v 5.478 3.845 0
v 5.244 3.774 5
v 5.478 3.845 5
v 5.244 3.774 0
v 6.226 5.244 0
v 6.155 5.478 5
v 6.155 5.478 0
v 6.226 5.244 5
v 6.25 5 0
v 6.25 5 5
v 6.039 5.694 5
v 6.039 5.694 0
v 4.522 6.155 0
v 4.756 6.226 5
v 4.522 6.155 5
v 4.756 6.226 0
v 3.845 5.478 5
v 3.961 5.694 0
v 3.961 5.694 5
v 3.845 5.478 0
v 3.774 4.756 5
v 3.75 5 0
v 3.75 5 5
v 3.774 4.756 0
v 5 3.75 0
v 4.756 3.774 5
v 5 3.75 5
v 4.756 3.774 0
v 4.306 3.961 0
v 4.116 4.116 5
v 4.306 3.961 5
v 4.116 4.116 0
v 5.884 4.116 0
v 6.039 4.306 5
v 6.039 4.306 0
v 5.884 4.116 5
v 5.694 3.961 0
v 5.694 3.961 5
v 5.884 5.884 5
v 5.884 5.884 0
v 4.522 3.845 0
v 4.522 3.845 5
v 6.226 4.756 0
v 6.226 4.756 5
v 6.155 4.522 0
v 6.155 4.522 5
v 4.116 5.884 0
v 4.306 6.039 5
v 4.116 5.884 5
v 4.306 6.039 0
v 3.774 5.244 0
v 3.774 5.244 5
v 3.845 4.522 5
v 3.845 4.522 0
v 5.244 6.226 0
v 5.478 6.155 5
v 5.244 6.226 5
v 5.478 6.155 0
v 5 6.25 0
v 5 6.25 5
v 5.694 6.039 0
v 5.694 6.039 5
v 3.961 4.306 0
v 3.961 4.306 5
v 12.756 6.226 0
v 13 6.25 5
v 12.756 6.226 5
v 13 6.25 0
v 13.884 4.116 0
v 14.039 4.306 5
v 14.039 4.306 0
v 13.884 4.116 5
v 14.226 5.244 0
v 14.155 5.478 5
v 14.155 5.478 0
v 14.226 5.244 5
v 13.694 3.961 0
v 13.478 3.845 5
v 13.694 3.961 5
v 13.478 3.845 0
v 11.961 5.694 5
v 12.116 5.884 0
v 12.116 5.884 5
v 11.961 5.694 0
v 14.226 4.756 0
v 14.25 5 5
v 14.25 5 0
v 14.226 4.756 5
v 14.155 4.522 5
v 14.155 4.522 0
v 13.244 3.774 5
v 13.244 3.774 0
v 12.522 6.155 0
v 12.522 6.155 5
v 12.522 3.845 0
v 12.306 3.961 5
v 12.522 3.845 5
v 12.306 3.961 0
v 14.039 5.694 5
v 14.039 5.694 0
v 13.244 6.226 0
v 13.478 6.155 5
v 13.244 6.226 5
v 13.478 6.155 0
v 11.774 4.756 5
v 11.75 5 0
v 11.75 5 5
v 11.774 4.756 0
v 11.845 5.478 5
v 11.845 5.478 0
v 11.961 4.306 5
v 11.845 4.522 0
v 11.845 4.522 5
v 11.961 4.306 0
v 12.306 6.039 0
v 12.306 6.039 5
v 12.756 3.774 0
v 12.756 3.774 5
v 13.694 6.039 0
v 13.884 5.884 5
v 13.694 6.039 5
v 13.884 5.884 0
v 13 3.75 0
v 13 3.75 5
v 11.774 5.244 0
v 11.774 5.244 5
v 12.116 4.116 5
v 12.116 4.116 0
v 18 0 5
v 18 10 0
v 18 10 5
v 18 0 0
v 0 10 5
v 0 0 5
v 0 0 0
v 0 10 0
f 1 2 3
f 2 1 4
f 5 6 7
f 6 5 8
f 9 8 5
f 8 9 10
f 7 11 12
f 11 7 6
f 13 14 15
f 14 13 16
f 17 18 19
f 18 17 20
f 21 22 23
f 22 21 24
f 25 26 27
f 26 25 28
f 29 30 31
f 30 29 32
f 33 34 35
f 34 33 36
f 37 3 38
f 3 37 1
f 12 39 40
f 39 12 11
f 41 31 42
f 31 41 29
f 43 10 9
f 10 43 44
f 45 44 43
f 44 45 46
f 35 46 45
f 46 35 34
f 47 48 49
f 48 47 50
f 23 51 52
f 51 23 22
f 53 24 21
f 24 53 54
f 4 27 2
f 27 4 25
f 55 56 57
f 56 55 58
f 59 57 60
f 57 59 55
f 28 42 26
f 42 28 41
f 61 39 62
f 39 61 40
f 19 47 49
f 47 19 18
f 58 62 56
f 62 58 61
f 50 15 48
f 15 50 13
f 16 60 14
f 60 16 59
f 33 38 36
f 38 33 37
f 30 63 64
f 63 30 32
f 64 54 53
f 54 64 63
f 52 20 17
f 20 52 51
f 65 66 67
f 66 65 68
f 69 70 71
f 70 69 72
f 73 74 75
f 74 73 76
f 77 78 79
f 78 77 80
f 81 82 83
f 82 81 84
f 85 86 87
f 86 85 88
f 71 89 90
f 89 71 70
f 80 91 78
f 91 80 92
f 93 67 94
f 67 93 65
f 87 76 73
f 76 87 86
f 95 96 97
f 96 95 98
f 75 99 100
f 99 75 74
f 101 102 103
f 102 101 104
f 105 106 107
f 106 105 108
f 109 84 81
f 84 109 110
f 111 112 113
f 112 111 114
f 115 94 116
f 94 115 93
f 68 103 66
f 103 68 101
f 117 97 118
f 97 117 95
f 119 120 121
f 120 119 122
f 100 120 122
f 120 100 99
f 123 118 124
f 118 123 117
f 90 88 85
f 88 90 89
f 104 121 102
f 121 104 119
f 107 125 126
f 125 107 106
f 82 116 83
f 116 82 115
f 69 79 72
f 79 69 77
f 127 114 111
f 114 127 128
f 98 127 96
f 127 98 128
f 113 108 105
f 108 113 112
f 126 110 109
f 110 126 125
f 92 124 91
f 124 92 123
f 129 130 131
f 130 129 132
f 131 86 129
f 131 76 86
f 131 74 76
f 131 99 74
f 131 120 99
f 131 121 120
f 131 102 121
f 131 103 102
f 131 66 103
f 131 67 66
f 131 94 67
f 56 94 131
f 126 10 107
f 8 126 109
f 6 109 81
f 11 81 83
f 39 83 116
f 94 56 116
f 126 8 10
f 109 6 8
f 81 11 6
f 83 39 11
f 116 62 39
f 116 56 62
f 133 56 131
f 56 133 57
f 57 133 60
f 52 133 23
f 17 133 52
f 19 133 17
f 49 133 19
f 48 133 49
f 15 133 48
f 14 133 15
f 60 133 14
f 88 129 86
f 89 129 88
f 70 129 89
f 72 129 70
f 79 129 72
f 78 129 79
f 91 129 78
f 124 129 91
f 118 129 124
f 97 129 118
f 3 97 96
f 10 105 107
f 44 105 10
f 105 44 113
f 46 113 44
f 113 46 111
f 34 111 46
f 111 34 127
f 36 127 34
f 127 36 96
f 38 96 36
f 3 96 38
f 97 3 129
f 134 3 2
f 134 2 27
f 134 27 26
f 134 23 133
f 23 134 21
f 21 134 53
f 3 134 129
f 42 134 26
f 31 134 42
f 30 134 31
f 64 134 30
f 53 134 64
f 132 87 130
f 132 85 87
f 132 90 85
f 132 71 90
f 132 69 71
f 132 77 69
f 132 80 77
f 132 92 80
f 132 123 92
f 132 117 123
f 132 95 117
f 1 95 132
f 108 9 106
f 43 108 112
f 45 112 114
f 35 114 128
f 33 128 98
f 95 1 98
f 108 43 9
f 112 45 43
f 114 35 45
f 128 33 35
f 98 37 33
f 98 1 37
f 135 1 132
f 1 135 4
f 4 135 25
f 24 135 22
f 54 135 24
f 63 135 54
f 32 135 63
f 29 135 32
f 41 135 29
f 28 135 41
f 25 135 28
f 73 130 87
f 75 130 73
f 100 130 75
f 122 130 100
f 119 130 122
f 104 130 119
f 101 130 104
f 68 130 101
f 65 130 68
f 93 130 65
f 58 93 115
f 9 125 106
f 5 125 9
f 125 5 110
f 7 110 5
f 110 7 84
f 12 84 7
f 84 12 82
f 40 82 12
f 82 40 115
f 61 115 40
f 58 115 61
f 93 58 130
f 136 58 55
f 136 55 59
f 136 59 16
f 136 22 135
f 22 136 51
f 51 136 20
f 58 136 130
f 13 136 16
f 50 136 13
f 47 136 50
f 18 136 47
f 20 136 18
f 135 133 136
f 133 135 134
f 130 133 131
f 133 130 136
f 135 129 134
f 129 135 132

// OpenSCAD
$fn = 32;

// ----------------------------------------------------------------------
// Micro pad: two-hole pad, 5-20 mm class
// ----------------------------------------------------------------------

// --- parameters (mm) ---
pad_l = 18;               // pad length, X
pad_w = 10;               // pad width, Y
pad_t = 5;                // pad thickness, Z
hole_d = 2.5;             // hole diameter
hole_x = 5;               // X of the first hole centre

difference() {
  cube([pad_l, pad_w, pad_t]);
  for (x = [hole_x, pad_l - hole_x])
    translate([x, pad_w / 2, -1])
      cylinder(h = pad_t + 2, d = hole_d);
}
